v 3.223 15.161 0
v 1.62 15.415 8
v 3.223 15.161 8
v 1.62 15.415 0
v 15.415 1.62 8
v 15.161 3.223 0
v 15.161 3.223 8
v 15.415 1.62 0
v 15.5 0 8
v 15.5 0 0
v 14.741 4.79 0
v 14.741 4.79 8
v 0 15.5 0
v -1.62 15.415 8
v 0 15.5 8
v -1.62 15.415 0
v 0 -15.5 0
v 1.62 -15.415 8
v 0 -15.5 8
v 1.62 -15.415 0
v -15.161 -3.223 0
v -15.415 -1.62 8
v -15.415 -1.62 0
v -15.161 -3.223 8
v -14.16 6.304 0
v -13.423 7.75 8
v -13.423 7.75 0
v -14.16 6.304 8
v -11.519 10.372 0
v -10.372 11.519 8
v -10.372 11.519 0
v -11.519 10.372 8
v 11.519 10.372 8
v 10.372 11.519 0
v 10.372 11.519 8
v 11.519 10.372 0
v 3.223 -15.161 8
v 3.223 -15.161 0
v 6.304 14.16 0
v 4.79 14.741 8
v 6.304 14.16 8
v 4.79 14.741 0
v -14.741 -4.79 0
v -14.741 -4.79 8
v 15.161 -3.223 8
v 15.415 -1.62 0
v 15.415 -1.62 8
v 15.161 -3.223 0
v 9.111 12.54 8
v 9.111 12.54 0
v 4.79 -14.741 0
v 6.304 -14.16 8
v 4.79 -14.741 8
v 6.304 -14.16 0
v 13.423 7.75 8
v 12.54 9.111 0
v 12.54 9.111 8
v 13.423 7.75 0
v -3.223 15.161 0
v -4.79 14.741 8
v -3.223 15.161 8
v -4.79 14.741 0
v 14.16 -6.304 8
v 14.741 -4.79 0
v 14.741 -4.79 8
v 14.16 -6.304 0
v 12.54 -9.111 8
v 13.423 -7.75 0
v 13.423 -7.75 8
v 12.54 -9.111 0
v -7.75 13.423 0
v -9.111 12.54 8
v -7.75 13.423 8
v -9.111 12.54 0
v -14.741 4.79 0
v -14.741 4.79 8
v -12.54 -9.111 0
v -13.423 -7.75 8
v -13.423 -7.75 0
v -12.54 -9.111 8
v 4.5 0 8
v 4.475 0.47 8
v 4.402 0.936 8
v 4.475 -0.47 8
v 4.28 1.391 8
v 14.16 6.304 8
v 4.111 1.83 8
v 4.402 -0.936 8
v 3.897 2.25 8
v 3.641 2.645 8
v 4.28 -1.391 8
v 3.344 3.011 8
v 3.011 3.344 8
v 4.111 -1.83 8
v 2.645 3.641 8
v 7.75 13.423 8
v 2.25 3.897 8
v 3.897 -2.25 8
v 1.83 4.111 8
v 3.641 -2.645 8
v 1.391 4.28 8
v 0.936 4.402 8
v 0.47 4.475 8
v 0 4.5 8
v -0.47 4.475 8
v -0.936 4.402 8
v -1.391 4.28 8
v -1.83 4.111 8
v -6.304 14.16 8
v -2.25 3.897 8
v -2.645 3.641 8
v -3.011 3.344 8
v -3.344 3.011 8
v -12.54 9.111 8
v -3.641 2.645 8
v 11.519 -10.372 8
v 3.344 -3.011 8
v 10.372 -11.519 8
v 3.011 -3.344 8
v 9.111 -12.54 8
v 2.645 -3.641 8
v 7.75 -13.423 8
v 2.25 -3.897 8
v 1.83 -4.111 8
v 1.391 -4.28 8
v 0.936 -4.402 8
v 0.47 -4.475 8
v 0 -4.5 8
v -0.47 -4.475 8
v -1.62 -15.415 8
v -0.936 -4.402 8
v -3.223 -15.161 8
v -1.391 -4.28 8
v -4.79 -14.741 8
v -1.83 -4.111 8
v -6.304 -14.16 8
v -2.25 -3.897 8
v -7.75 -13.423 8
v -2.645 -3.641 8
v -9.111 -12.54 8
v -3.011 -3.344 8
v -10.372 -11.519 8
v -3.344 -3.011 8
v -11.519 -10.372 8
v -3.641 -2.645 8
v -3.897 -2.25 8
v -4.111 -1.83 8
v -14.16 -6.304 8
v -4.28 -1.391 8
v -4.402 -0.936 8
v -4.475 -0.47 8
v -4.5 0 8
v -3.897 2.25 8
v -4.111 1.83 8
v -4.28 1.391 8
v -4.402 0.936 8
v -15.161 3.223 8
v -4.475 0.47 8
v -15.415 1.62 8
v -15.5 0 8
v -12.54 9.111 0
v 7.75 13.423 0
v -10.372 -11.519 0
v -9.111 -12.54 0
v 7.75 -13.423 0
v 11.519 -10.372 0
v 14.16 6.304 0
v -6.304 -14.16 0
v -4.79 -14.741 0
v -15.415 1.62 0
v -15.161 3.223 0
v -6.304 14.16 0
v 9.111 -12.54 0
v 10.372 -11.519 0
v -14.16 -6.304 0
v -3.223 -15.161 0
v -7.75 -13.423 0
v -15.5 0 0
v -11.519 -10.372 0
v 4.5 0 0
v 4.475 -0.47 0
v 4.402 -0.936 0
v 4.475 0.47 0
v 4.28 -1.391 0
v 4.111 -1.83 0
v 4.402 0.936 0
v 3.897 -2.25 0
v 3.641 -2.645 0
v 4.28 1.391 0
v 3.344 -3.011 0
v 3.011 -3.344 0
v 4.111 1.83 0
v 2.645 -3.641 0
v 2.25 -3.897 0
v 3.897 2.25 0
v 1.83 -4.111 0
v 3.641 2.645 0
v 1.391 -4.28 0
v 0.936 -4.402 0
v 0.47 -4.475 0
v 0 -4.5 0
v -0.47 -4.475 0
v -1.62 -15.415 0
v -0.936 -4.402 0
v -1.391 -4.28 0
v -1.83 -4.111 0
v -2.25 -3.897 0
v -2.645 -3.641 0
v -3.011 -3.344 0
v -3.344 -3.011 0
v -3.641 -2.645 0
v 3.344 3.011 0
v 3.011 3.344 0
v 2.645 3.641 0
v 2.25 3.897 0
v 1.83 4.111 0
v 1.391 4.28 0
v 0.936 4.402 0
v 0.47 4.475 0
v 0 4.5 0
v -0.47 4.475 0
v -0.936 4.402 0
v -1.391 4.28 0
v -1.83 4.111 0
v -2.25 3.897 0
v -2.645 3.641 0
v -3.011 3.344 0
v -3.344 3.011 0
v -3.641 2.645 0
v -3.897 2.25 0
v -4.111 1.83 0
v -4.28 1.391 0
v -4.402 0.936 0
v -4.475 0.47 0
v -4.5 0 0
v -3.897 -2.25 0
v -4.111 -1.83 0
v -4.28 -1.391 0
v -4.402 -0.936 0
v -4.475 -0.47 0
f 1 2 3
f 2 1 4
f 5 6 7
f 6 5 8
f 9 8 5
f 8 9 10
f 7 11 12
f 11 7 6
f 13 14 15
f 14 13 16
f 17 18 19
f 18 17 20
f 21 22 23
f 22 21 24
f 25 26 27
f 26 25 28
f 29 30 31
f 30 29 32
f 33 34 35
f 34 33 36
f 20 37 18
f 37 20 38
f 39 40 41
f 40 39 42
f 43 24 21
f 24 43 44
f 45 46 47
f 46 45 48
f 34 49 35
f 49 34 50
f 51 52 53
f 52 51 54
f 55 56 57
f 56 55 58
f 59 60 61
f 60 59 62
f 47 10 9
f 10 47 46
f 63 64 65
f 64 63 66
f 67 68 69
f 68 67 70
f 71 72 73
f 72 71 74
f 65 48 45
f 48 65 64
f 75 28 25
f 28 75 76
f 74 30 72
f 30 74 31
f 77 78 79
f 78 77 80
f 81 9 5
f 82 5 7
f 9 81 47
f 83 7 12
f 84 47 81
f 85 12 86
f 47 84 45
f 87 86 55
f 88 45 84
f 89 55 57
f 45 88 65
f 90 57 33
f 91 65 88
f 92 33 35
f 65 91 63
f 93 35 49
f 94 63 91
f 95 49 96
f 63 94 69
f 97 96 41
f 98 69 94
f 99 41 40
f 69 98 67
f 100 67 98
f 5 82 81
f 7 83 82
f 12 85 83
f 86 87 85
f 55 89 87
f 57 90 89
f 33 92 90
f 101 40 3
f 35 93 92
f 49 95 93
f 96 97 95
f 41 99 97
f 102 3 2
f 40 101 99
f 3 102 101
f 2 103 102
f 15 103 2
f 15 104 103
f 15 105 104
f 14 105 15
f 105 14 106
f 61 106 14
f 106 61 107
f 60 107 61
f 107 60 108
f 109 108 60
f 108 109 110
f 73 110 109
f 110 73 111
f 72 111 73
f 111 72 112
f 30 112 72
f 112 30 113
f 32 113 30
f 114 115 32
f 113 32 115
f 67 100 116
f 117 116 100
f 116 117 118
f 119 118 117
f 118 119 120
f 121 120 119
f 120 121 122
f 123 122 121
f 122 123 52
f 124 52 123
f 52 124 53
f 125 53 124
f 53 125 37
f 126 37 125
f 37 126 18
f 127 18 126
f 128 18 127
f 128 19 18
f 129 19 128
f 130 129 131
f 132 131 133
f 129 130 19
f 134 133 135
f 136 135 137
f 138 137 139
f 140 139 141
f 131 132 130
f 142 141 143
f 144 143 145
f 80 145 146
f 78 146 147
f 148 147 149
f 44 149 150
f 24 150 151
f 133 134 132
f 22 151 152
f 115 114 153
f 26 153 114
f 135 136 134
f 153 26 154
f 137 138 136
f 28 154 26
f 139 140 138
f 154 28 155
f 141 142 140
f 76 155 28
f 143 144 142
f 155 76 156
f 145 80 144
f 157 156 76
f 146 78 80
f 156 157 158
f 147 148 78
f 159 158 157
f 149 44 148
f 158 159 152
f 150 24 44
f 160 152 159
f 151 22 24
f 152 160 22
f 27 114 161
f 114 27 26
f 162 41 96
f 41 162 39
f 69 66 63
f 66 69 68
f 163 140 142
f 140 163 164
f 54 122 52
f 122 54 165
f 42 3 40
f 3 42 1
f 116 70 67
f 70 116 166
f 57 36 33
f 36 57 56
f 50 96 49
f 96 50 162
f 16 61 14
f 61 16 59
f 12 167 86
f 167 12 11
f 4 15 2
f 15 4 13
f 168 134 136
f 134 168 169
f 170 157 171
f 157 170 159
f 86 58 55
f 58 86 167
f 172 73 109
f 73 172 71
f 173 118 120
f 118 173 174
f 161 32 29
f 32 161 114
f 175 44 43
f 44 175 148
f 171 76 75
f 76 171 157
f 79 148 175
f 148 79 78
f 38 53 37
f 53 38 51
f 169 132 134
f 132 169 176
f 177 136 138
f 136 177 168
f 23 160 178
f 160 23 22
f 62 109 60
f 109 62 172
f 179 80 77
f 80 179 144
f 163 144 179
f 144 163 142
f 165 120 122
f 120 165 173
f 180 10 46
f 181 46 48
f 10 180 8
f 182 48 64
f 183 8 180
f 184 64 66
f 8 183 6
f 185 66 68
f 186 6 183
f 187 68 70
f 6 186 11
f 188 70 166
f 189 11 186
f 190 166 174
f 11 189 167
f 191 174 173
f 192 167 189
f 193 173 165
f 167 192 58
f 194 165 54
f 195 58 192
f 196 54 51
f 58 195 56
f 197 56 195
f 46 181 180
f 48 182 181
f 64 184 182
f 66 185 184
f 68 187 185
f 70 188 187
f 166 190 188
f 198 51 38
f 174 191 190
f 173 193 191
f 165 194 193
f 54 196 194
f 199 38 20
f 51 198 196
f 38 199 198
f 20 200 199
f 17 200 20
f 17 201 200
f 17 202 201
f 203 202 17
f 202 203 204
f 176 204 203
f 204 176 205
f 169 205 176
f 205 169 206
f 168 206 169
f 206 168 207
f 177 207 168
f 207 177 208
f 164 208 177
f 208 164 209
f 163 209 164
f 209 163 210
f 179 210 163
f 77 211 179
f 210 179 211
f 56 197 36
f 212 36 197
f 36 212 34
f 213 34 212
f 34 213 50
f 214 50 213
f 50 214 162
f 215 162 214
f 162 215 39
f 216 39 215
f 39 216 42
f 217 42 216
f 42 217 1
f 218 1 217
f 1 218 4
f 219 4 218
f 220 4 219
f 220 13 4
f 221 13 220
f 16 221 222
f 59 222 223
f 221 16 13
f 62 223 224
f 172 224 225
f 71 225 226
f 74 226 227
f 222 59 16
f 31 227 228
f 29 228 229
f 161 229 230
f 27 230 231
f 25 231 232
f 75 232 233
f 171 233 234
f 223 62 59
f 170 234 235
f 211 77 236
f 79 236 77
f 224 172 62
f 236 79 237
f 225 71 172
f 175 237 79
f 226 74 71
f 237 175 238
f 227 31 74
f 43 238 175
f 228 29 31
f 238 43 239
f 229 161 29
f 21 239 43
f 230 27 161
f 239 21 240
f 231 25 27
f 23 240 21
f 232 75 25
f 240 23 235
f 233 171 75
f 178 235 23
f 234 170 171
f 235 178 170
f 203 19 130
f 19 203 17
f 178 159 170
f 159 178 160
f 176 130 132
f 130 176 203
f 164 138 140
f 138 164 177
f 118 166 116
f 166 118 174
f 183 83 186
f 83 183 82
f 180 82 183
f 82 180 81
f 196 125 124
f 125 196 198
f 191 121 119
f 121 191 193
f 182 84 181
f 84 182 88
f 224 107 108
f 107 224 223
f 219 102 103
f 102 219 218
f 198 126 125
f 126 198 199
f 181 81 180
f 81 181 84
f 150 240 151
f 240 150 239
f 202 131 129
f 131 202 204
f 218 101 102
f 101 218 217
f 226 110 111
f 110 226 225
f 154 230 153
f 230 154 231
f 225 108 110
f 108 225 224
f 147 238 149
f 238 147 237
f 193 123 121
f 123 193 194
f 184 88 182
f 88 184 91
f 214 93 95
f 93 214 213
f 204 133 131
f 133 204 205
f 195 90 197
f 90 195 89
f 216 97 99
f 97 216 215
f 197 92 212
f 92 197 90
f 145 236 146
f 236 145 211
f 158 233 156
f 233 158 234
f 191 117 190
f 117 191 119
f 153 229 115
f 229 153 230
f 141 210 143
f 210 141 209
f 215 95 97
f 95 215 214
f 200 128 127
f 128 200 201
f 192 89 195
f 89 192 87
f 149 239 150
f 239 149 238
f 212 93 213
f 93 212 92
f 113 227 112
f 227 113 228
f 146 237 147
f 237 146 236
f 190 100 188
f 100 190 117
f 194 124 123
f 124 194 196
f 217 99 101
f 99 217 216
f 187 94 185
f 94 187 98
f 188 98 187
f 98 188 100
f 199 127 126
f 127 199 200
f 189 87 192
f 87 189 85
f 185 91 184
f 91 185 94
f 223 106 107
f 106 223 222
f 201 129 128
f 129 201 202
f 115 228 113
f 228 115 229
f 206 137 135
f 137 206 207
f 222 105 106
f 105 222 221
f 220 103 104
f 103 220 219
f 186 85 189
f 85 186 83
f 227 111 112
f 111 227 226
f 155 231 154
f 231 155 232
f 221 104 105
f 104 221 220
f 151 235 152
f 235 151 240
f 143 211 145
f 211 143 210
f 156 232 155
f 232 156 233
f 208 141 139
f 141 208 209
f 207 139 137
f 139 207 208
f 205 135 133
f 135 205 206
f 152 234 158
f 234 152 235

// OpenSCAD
// ==========================================
// Whirlpool Refrigerator Pan Roller - WHEEL
// Part Number: W11578839
// Material: PETG or PLA (rigid)
// ==========================================

$fn = 60;

// WHEEL PARAMETERS
wheel_od = 31;
wheel_h = 8;
wheel_hole = 9;

echo("=== W11578839 PAN ROLLER WHEEL ===");
echo("Diameter:", wheel_od, "mm");
echo("Height:", wheel_h, "mm");
echo("Center hole:", wheel_hole, "mm");
echo("Material: PETG or PLA");

difference() {
    cylinder(h = wheel_h, d = wheel_od);
    translate([0, 0, -0.5])
        cylinder(h = wheel_h + 1, d = wheel_hole);
}
